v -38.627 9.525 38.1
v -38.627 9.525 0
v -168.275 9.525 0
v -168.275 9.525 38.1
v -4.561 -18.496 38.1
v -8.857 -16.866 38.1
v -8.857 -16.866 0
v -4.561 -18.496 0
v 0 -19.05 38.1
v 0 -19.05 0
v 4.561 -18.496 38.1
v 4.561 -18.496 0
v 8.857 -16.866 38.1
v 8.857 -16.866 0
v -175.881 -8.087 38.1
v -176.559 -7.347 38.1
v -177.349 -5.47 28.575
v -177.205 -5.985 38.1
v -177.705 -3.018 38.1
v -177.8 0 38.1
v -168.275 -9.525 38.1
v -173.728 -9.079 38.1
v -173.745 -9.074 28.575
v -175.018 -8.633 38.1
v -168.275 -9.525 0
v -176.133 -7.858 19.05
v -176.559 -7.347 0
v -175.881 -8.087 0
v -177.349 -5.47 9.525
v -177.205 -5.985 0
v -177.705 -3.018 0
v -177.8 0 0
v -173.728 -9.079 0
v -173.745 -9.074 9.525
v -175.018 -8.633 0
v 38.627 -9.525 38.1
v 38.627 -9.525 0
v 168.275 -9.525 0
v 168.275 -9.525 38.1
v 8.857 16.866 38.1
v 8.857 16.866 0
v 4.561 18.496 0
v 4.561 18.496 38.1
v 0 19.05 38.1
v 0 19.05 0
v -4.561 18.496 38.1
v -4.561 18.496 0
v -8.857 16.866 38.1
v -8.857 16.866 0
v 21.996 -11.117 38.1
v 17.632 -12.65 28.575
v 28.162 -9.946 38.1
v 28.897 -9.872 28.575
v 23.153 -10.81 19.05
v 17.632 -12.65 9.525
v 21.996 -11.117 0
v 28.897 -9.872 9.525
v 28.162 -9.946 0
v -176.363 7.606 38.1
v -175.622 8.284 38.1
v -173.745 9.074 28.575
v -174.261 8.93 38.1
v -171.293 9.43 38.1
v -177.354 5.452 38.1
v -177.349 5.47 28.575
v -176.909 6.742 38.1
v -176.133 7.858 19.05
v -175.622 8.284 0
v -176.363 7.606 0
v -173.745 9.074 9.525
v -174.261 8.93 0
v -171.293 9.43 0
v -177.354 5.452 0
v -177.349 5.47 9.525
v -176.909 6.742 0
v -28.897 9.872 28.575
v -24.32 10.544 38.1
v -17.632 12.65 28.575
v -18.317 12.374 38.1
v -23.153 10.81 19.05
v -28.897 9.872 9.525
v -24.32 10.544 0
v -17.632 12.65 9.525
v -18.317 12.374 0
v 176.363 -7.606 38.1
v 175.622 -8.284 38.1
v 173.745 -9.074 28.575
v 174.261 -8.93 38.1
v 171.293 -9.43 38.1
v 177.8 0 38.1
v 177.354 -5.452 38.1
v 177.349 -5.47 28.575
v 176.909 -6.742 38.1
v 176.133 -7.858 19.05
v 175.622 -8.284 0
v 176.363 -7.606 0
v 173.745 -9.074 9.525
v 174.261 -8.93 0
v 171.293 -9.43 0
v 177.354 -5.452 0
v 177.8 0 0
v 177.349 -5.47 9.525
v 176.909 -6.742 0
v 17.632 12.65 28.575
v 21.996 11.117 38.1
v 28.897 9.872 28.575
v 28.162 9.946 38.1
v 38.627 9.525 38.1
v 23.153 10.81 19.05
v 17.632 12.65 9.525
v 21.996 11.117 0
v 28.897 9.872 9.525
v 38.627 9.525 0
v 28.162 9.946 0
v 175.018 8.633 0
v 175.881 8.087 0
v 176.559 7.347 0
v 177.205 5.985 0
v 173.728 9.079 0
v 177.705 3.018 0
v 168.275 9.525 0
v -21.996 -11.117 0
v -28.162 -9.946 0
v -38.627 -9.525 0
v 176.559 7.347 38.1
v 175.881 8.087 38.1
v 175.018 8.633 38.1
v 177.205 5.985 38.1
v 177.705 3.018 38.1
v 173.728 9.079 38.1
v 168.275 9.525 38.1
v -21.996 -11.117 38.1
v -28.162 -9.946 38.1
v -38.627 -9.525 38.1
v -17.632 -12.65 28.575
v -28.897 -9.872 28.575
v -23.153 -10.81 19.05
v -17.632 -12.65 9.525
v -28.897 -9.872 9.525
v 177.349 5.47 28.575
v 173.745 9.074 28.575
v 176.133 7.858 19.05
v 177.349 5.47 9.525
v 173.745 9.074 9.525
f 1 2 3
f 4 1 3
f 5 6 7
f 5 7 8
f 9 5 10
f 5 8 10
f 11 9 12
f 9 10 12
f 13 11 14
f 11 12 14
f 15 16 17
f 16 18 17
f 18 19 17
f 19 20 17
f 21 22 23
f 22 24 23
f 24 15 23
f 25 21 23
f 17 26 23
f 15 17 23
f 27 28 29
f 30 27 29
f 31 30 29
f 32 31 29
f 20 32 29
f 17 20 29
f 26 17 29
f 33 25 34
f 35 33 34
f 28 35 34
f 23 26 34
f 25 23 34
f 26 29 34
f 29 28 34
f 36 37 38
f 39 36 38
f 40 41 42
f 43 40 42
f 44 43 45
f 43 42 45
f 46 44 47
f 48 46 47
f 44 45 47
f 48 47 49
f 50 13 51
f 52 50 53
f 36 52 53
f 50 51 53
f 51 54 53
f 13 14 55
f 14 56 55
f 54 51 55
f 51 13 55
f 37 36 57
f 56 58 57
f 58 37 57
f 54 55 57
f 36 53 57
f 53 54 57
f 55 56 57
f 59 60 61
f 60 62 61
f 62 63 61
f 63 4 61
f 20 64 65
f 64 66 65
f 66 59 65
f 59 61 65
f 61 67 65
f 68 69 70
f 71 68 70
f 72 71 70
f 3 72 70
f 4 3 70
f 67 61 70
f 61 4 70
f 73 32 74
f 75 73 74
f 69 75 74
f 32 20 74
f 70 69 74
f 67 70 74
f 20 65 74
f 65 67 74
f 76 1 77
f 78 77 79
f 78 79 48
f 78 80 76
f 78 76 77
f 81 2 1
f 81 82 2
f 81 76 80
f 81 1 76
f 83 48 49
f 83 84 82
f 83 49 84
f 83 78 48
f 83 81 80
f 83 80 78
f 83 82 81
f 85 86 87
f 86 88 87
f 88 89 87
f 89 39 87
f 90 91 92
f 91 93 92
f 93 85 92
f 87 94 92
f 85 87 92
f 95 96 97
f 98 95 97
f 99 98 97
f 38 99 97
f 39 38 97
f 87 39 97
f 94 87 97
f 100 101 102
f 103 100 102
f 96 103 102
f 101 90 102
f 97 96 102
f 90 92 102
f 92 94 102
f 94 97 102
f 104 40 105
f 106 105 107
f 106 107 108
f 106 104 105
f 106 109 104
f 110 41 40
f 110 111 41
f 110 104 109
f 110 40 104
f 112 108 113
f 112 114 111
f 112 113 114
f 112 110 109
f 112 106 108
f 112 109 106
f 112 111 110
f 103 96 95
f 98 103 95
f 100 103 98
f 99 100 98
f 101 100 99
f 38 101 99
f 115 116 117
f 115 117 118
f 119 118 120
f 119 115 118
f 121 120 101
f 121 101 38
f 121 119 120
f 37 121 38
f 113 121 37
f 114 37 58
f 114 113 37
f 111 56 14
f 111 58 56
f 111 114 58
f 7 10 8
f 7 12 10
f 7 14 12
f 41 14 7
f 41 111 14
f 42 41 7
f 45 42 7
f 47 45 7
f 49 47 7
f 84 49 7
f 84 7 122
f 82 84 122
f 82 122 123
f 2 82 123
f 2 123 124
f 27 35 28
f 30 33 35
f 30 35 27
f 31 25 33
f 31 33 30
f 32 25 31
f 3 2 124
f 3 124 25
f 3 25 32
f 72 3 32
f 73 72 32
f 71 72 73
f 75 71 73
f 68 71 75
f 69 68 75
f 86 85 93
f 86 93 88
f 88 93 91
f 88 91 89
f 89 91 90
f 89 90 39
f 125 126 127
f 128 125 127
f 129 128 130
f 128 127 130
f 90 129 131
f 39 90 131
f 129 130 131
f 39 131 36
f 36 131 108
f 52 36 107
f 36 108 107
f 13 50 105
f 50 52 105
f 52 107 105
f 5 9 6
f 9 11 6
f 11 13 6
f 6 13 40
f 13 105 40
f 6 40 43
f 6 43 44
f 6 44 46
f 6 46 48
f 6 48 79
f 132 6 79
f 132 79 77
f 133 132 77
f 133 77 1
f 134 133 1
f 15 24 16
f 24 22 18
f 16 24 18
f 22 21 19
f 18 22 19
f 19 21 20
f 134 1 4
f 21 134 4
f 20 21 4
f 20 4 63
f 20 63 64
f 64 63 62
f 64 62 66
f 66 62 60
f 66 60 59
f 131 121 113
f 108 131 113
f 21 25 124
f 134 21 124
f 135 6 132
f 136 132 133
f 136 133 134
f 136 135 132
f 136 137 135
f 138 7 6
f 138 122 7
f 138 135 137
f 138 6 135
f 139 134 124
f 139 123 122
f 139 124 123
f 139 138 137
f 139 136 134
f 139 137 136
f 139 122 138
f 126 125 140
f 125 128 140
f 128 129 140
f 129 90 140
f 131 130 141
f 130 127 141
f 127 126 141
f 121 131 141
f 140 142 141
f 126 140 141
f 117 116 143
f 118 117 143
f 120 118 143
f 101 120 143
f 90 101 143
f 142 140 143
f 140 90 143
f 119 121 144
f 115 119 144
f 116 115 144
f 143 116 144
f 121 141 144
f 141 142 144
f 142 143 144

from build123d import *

# Parameters (mm, degrees)
F0_R        = 7.9375
F1_DEPTH    = 38.1
F2_T1_DEPTH = 85.725
F3_T1_DEPTH = 38.1


# Not quite as in the source:
# - a fillet or chamfer that OpenCascade refuses, or shapes differently, is made with other operations: its cross-section is extruded or revolved along the edge and cut away or added
# - a length typed as a fraction of an inch, garbled in the dataset ("3 / 203.2 mm" for 3/8 in), is restored


with BuildPart() as f1:
    # F0 (on Top) → F1 (new body)
    with BuildSketch(Plane.XY):
        with BuildLine():
            Line((16.4977839421, -9.525), (177.8, -9.525))
            Line((177.8, -9.525), (177.8, 9.525))
            Line((177.8, 9.525), (16.4977839421, 9.525))
            ThreePointArc((16.4977839421, 9.525), (0, 19.05), (-16.4977839421, 9.525))
            Line((-16.4977839421, 9.525), (-177.8, 9.525))
            Line((-177.8, 9.525), (-177.8, -9.525))
            Line((-177.8, -9.525), (-16.4977839421, -9.525))
            ThreePointArc((-16.4977839421, -9.525), (0, -19.05), (16.4977839421, -9.525))
        make_face()
        Circle(F0_R, mode=Mode.SUBTRACT)
        Circle(F0_R)
    extrude(amount=F1_DEPTH)

    # F2: fillet of radius 9.525 on 4 edges, made by hand

    # F2_s2 → F2_t1 (cut)
    with BuildSketch(Plane.XY.offset(-23.8125)):
        with BuildLine():
            add(Edge.make_bspline(
                [(-177.8, 0), (-177.8, -9.525), (-168.275, -9.525)],
                knots=[0, 0, 0, 1, 1, 1], degree=2, weights=[1, 1.8571428571, 1]))
            Line((-168.275, -9.525), (-177.8, -9.525))
            Line((-177.8, -9.525), (-177.8, 0))
        make_face()
        with BuildLine():
            add(Edge.make_bspline(
                [(-168.275, 9.525), (-177.8, 9.525), (-177.8, 0)],
                knots=[0, 0, 0, 1, 1, 1], degree=2, weights=[1, 1.8571428571, 1]))
            Line((-177.8, 0), (-177.8, 9.525))
            Line((-177.8, 9.525), (-168.275, 9.525))
        make_face()
        with BuildLine():
            add(Edge.make_bspline(
                [(177.8, 0), (177.8, 9.525), (168.275, 9.525)],
                knots=[0, 0, 0, 1, 1, 1], degree=2, weights=[1, 1.8571428571, 1]))
            Line((168.275, 9.525), (177.8, 9.525))
            Line((177.8, 9.525), (177.8, 0))
        make_face()
        with BuildLine():
            add(Edge.make_bspline(
                [(168.275, -9.525), (177.8, -9.525), (177.8, 0)],
                knots=[0, 0, 0, 1, 1, 1], degree=2, weights=[1, 1.8571428571, 1]))
            Line((177.8, 0), (177.8, -9.525))
            Line((177.8, -9.525), (168.275, -9.525))
        make_face()
    extrude(amount=F2_T1_DEPTH, mode=Mode.SUBTRACT)

    # F3: fillet of radius 64.0333905996 on 4 edges, made by hand

    # F3_s2 → F3_t1 (join)
    with BuildSketch(Plane.XY):
        with BuildLine():
            add(Edge.make_bspline(
                [(8.8566007427, 16.8660346046), (22.8364726227, 9.525), (38.6265836688, 9.525)],
                knots=[0, 0, 0, 1, 1, 1], degree=2, weights=[1, 1.8571428571, 1]))
            Line((38.6265836688, 9.525), (16.4977839421, 9.525))
            ThreePointArc((16.4977839421, 9.525), (13.1978749408, 13.737488746), (8.8566007427, 16.8660346046))
        make_face()
        with BuildLine():
            add(Edge.make_bspline(
                [(-38.6265836688, 9.525), (-22.8364726227, 9.525), (-8.8566007427, 16.8660346046)],
                knots=[0, 0, 0, 1, 1, 1], degree=2, weights=[1, 1.8571428571, 1]))
            ThreePointArc((-8.8566007427, 16.8660346046), (-13.1978749408, 13.737488746), (-16.4977839421, 9.525))
            Line((-16.4977839421, 9.525), (-38.6265836688, 9.525))
        make_face()
        with BuildLine():
            add(Edge.make_bspline(
                [(-8.8566007427, -16.8660346046), (-22.8364726227, -9.525), (-38.6265836688, -9.525)],
                knots=[0, 0, 0, 1, 1, 1], degree=2, weights=[1, 1.8571428571, 1]))
            Line((-38.6265836688, -9.525), (-16.4977839421, -9.525))
            ThreePointArc((-16.4977839421, -9.525), (-13.1978749408, -13.737488746), (-8.8566007427, -16.8660346046))
        make_face()
        with BuildLine():
            add(Edge.make_bspline(
                [(8.8566007427, -16.8660346046), (22.8364726227, -9.525), (38.6265836688, -9.525)],
                knots=[0, 0, 0, 1, 1, 1], degree=2, weights=[1, 1.8571428571, 1]))
            Line((38.6265836688, -9.525), (16.4977839421, -9.525))
            ThreePointArc((16.4977839421, -9.525), (13.1978749408, -13.737488746), (8.8566007427, -16.8660346046))
        make_face()
    extrude(amount=F3_T1_DEPTH)


solid = f1.part
